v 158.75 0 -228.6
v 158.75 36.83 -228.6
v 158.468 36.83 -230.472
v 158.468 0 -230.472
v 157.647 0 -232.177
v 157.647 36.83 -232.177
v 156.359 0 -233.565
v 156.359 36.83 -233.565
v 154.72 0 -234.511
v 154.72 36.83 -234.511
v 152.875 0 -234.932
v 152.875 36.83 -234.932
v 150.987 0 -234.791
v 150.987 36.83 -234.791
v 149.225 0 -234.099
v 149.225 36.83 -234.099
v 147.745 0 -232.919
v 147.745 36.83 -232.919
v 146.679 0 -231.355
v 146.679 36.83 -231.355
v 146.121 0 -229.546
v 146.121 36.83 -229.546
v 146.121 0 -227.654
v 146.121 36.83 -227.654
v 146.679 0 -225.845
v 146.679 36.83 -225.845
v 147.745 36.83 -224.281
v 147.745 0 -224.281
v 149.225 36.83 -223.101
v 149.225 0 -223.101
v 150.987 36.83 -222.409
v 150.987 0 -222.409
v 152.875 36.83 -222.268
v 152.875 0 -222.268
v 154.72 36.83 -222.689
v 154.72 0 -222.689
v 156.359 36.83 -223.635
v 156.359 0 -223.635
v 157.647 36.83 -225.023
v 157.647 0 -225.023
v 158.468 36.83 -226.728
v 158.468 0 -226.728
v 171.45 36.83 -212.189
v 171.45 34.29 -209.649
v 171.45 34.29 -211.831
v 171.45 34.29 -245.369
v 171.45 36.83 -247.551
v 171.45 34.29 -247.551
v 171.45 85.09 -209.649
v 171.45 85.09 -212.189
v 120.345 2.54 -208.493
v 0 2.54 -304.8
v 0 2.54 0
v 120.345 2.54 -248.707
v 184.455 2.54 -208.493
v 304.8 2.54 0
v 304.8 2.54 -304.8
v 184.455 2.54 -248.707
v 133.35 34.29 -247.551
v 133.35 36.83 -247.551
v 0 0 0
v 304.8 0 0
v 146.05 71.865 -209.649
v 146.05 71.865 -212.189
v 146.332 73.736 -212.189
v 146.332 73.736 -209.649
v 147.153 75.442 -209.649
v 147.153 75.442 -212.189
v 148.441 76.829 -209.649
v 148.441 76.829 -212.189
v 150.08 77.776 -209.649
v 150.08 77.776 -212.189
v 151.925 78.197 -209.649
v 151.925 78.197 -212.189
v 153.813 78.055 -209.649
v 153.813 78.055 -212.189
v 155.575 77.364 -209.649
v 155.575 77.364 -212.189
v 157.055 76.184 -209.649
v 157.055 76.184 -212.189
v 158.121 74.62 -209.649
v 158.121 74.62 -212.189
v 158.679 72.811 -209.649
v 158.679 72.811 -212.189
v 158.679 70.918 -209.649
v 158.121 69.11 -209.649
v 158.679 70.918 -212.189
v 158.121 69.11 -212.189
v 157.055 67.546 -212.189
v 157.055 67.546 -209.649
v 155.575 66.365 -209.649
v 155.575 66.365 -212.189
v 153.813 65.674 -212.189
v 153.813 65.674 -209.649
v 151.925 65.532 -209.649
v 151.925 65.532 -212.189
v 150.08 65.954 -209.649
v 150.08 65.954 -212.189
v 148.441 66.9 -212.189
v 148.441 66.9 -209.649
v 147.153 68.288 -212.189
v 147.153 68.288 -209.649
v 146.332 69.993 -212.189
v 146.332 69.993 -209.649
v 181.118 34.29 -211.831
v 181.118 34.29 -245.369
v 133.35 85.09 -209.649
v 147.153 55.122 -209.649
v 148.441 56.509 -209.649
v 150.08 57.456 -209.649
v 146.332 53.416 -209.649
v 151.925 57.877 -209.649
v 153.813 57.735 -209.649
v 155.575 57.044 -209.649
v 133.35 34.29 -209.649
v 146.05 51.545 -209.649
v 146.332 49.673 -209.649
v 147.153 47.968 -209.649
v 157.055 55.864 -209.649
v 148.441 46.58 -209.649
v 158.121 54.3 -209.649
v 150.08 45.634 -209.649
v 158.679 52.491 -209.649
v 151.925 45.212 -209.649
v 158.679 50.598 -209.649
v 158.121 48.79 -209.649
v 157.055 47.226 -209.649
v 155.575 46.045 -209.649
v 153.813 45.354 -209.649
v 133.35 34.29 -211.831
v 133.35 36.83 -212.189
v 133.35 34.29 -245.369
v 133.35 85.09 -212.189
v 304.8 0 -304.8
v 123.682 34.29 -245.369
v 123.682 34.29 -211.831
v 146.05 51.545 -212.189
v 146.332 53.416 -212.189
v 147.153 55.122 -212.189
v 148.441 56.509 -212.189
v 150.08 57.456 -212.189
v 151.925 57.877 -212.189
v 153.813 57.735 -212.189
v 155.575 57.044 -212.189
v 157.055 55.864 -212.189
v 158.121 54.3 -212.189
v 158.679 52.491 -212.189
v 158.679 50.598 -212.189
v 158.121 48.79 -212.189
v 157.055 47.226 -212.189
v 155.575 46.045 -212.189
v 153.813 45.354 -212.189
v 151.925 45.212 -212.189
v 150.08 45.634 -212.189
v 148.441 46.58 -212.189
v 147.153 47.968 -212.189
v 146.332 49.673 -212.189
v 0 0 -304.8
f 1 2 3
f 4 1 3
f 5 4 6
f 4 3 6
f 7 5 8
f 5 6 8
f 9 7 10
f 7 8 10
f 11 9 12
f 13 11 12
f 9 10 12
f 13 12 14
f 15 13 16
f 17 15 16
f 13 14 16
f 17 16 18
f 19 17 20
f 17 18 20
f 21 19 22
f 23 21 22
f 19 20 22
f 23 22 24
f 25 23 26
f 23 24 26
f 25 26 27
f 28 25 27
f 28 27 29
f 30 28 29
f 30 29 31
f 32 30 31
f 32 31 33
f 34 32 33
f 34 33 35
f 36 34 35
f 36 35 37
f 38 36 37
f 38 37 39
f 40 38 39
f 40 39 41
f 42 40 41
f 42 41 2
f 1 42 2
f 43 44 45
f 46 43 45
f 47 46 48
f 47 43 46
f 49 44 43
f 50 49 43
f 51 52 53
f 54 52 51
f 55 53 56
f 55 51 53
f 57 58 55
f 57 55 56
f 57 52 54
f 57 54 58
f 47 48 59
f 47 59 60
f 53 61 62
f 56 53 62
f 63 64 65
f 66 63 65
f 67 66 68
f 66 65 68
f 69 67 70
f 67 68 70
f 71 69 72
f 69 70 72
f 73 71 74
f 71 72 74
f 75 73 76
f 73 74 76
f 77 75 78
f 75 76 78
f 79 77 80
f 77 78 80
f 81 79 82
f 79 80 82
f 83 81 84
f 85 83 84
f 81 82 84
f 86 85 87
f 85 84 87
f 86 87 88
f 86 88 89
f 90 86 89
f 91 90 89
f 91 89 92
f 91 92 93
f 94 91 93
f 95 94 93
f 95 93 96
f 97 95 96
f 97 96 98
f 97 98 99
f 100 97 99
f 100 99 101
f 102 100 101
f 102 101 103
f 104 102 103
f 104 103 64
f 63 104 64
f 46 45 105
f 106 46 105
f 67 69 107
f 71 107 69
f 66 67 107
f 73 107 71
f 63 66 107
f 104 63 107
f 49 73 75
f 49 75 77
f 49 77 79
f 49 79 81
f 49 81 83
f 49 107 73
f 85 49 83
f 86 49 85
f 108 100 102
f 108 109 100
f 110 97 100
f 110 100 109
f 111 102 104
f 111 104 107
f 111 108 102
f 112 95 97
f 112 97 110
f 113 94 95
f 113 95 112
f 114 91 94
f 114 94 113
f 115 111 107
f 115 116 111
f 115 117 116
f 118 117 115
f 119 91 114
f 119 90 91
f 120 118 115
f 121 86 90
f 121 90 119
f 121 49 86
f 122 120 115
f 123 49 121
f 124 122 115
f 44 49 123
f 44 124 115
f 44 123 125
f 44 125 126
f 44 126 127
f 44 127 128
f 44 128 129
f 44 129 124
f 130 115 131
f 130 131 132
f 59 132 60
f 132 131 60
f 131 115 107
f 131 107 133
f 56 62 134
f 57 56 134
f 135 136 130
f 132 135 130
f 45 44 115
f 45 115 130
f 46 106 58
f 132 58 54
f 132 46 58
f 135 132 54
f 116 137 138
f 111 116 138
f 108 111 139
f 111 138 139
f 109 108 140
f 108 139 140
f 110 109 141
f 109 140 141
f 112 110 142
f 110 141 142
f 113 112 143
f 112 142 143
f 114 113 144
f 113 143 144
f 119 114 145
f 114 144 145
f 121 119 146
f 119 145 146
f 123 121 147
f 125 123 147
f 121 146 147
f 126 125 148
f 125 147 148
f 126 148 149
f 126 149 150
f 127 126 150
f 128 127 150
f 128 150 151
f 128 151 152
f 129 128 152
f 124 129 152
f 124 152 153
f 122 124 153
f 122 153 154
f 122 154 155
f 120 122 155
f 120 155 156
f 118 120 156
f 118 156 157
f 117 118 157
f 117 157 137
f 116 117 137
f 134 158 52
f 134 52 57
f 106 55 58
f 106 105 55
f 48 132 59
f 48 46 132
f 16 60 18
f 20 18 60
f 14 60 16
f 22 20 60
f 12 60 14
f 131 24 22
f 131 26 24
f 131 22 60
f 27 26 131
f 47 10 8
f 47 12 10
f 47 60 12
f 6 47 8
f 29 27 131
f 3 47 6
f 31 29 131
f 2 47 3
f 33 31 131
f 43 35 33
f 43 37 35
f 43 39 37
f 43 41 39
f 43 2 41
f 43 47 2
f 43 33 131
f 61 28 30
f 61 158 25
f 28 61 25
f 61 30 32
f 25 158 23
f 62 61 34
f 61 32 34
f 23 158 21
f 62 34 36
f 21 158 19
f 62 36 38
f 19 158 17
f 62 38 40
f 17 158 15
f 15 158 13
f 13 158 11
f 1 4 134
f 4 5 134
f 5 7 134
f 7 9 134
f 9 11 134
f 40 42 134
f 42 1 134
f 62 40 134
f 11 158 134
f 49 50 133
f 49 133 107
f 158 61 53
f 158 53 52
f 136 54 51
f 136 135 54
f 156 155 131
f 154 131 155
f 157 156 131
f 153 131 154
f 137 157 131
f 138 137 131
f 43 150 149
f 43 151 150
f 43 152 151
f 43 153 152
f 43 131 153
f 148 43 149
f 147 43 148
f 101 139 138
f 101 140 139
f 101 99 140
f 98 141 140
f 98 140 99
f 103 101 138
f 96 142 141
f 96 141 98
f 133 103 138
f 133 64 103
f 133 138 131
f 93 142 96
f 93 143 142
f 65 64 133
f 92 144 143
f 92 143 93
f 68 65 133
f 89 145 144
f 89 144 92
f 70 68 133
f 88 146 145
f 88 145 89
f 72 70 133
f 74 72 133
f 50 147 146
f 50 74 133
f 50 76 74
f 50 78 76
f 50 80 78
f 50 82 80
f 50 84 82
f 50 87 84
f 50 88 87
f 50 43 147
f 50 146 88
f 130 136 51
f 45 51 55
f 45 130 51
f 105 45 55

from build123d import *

# Parameters (mm, degrees)
SKETCH1_W                = 304.8
SKETCH1_H                = 304.8
BOSS_EXTRUDE1_DEPTH      = 2.54
SKETCH2_W                = 64.109804122
SKETCH2_H                = 40.213084064
BOSS_EXTRUDE2_DEPTH      = 31.75
BOSS_EXTRUDE2_TAPER      = 6
SKETCH3_R                = 6.35
CUT_EXTRUDE1_DEPTH       = 25.4
BOSS_EXTRUDE3_DEPTH      = 19.05
BOSS_EXTRUDE3_DEPTH_BACK = 19.05
SKETCH5_R                = 6.35
CUT_EXTRUDE2_DEPTH       = 50.8
SKETCH6_R                = 6.35
CUT_EXTRUDE3_DEPTH       = 19.05


with BuildPart() as part:
    # Sketch1 → Boss-Extrude1 (new body)
    with BuildSketch(Plane(origin=(0, 0, 0), x_dir=(1, 0, 0), z_dir=(0, 1, 0))):
        with Locations((152.4, 152.4)):
            Rectangle(SKETCH1_W, SKETCH1_H)
    extrude(amount=BOSS_EXTRUDE1_DEPTH)

    # Sketch2 → Boss-Extrude2 (add)
    with BuildSketch(Plane(origin=(0, 2.54, 0), x_dir=(1, 0, 0), z_dir=(0, 1, 0))):
        with Locations((152.4, 228.6)):
            Rectangle(SKETCH2_W, SKETCH2_H)
    extrude(amount=BOSS_EXTRUDE2_DEPTH, taper=BOSS_EXTRUDE2_TAPER)

    # Sketch3 → Cut-Extrude1 (cut)
    with BuildSketch(Plane(origin=(0, 34.29, 0), x_dir=(1, 0, 0), z_dir=(0, 1, 0))):
        with Locations((152.4, 228.6)):
            Circle(SKETCH3_R)
    extrude(amount=-CUT_EXTRUDE1_DEPTH, mode=Mode.SUBTRACT)

    # Sketch4 → Boss-Extrude3 (add, two sides)
    with BuildSketch(Plane(origin=(152.4, 0, 0), x_dir=(0, 0, -1), z_dir=(1, 0, 0))) as boss_extrude3_sk:
        Polygon((209.648741009, 34.29), (247.551258991, 34.29), (247.551258991, 36.83), (212.188741009, 36.83), (212.188741009, 77.47), (212.188741009, 85.09), (209.648741009, 85.09), align=None)
    extrude(amount=BOSS_EXTRUDE3_DEPTH)
    extrude(boss_extrude3_sk.sketch, amount=-BOSS_EXTRUDE3_DEPTH_BACK)

    # Sketch5 → Cut-Extrude2 (cut)
    with BuildSketch(Plane(origin=(0, 36.83, 0), x_dir=(1, 0, 0), z_dir=(0, 1, 0))):
        with Locations((152.4, 228.6)):
            Circle(SKETCH5_R)
    extrude(amount=-CUT_EXTRUDE2_DEPTH, mode=Mode.SUBTRACT)

    # Sketch6 → Cut-Extrude3 (cut)
    with BuildSketch(Plane(origin=(0, 0, -212.188741009), x_dir=(-1, 0, 0), z_dir=(0, 0, -1))):
        with Locations((-152.4, 71.864665845)):
            Circle(SKETCH6_R)
        with Locations((-152.4, 51.544665845)):
            Circle(SKETCH6_R)
    extrude(amount=-CUT_EXTRUDE3_DEPTH, mode=Mode.SUBTRACT)


solid = part.part
